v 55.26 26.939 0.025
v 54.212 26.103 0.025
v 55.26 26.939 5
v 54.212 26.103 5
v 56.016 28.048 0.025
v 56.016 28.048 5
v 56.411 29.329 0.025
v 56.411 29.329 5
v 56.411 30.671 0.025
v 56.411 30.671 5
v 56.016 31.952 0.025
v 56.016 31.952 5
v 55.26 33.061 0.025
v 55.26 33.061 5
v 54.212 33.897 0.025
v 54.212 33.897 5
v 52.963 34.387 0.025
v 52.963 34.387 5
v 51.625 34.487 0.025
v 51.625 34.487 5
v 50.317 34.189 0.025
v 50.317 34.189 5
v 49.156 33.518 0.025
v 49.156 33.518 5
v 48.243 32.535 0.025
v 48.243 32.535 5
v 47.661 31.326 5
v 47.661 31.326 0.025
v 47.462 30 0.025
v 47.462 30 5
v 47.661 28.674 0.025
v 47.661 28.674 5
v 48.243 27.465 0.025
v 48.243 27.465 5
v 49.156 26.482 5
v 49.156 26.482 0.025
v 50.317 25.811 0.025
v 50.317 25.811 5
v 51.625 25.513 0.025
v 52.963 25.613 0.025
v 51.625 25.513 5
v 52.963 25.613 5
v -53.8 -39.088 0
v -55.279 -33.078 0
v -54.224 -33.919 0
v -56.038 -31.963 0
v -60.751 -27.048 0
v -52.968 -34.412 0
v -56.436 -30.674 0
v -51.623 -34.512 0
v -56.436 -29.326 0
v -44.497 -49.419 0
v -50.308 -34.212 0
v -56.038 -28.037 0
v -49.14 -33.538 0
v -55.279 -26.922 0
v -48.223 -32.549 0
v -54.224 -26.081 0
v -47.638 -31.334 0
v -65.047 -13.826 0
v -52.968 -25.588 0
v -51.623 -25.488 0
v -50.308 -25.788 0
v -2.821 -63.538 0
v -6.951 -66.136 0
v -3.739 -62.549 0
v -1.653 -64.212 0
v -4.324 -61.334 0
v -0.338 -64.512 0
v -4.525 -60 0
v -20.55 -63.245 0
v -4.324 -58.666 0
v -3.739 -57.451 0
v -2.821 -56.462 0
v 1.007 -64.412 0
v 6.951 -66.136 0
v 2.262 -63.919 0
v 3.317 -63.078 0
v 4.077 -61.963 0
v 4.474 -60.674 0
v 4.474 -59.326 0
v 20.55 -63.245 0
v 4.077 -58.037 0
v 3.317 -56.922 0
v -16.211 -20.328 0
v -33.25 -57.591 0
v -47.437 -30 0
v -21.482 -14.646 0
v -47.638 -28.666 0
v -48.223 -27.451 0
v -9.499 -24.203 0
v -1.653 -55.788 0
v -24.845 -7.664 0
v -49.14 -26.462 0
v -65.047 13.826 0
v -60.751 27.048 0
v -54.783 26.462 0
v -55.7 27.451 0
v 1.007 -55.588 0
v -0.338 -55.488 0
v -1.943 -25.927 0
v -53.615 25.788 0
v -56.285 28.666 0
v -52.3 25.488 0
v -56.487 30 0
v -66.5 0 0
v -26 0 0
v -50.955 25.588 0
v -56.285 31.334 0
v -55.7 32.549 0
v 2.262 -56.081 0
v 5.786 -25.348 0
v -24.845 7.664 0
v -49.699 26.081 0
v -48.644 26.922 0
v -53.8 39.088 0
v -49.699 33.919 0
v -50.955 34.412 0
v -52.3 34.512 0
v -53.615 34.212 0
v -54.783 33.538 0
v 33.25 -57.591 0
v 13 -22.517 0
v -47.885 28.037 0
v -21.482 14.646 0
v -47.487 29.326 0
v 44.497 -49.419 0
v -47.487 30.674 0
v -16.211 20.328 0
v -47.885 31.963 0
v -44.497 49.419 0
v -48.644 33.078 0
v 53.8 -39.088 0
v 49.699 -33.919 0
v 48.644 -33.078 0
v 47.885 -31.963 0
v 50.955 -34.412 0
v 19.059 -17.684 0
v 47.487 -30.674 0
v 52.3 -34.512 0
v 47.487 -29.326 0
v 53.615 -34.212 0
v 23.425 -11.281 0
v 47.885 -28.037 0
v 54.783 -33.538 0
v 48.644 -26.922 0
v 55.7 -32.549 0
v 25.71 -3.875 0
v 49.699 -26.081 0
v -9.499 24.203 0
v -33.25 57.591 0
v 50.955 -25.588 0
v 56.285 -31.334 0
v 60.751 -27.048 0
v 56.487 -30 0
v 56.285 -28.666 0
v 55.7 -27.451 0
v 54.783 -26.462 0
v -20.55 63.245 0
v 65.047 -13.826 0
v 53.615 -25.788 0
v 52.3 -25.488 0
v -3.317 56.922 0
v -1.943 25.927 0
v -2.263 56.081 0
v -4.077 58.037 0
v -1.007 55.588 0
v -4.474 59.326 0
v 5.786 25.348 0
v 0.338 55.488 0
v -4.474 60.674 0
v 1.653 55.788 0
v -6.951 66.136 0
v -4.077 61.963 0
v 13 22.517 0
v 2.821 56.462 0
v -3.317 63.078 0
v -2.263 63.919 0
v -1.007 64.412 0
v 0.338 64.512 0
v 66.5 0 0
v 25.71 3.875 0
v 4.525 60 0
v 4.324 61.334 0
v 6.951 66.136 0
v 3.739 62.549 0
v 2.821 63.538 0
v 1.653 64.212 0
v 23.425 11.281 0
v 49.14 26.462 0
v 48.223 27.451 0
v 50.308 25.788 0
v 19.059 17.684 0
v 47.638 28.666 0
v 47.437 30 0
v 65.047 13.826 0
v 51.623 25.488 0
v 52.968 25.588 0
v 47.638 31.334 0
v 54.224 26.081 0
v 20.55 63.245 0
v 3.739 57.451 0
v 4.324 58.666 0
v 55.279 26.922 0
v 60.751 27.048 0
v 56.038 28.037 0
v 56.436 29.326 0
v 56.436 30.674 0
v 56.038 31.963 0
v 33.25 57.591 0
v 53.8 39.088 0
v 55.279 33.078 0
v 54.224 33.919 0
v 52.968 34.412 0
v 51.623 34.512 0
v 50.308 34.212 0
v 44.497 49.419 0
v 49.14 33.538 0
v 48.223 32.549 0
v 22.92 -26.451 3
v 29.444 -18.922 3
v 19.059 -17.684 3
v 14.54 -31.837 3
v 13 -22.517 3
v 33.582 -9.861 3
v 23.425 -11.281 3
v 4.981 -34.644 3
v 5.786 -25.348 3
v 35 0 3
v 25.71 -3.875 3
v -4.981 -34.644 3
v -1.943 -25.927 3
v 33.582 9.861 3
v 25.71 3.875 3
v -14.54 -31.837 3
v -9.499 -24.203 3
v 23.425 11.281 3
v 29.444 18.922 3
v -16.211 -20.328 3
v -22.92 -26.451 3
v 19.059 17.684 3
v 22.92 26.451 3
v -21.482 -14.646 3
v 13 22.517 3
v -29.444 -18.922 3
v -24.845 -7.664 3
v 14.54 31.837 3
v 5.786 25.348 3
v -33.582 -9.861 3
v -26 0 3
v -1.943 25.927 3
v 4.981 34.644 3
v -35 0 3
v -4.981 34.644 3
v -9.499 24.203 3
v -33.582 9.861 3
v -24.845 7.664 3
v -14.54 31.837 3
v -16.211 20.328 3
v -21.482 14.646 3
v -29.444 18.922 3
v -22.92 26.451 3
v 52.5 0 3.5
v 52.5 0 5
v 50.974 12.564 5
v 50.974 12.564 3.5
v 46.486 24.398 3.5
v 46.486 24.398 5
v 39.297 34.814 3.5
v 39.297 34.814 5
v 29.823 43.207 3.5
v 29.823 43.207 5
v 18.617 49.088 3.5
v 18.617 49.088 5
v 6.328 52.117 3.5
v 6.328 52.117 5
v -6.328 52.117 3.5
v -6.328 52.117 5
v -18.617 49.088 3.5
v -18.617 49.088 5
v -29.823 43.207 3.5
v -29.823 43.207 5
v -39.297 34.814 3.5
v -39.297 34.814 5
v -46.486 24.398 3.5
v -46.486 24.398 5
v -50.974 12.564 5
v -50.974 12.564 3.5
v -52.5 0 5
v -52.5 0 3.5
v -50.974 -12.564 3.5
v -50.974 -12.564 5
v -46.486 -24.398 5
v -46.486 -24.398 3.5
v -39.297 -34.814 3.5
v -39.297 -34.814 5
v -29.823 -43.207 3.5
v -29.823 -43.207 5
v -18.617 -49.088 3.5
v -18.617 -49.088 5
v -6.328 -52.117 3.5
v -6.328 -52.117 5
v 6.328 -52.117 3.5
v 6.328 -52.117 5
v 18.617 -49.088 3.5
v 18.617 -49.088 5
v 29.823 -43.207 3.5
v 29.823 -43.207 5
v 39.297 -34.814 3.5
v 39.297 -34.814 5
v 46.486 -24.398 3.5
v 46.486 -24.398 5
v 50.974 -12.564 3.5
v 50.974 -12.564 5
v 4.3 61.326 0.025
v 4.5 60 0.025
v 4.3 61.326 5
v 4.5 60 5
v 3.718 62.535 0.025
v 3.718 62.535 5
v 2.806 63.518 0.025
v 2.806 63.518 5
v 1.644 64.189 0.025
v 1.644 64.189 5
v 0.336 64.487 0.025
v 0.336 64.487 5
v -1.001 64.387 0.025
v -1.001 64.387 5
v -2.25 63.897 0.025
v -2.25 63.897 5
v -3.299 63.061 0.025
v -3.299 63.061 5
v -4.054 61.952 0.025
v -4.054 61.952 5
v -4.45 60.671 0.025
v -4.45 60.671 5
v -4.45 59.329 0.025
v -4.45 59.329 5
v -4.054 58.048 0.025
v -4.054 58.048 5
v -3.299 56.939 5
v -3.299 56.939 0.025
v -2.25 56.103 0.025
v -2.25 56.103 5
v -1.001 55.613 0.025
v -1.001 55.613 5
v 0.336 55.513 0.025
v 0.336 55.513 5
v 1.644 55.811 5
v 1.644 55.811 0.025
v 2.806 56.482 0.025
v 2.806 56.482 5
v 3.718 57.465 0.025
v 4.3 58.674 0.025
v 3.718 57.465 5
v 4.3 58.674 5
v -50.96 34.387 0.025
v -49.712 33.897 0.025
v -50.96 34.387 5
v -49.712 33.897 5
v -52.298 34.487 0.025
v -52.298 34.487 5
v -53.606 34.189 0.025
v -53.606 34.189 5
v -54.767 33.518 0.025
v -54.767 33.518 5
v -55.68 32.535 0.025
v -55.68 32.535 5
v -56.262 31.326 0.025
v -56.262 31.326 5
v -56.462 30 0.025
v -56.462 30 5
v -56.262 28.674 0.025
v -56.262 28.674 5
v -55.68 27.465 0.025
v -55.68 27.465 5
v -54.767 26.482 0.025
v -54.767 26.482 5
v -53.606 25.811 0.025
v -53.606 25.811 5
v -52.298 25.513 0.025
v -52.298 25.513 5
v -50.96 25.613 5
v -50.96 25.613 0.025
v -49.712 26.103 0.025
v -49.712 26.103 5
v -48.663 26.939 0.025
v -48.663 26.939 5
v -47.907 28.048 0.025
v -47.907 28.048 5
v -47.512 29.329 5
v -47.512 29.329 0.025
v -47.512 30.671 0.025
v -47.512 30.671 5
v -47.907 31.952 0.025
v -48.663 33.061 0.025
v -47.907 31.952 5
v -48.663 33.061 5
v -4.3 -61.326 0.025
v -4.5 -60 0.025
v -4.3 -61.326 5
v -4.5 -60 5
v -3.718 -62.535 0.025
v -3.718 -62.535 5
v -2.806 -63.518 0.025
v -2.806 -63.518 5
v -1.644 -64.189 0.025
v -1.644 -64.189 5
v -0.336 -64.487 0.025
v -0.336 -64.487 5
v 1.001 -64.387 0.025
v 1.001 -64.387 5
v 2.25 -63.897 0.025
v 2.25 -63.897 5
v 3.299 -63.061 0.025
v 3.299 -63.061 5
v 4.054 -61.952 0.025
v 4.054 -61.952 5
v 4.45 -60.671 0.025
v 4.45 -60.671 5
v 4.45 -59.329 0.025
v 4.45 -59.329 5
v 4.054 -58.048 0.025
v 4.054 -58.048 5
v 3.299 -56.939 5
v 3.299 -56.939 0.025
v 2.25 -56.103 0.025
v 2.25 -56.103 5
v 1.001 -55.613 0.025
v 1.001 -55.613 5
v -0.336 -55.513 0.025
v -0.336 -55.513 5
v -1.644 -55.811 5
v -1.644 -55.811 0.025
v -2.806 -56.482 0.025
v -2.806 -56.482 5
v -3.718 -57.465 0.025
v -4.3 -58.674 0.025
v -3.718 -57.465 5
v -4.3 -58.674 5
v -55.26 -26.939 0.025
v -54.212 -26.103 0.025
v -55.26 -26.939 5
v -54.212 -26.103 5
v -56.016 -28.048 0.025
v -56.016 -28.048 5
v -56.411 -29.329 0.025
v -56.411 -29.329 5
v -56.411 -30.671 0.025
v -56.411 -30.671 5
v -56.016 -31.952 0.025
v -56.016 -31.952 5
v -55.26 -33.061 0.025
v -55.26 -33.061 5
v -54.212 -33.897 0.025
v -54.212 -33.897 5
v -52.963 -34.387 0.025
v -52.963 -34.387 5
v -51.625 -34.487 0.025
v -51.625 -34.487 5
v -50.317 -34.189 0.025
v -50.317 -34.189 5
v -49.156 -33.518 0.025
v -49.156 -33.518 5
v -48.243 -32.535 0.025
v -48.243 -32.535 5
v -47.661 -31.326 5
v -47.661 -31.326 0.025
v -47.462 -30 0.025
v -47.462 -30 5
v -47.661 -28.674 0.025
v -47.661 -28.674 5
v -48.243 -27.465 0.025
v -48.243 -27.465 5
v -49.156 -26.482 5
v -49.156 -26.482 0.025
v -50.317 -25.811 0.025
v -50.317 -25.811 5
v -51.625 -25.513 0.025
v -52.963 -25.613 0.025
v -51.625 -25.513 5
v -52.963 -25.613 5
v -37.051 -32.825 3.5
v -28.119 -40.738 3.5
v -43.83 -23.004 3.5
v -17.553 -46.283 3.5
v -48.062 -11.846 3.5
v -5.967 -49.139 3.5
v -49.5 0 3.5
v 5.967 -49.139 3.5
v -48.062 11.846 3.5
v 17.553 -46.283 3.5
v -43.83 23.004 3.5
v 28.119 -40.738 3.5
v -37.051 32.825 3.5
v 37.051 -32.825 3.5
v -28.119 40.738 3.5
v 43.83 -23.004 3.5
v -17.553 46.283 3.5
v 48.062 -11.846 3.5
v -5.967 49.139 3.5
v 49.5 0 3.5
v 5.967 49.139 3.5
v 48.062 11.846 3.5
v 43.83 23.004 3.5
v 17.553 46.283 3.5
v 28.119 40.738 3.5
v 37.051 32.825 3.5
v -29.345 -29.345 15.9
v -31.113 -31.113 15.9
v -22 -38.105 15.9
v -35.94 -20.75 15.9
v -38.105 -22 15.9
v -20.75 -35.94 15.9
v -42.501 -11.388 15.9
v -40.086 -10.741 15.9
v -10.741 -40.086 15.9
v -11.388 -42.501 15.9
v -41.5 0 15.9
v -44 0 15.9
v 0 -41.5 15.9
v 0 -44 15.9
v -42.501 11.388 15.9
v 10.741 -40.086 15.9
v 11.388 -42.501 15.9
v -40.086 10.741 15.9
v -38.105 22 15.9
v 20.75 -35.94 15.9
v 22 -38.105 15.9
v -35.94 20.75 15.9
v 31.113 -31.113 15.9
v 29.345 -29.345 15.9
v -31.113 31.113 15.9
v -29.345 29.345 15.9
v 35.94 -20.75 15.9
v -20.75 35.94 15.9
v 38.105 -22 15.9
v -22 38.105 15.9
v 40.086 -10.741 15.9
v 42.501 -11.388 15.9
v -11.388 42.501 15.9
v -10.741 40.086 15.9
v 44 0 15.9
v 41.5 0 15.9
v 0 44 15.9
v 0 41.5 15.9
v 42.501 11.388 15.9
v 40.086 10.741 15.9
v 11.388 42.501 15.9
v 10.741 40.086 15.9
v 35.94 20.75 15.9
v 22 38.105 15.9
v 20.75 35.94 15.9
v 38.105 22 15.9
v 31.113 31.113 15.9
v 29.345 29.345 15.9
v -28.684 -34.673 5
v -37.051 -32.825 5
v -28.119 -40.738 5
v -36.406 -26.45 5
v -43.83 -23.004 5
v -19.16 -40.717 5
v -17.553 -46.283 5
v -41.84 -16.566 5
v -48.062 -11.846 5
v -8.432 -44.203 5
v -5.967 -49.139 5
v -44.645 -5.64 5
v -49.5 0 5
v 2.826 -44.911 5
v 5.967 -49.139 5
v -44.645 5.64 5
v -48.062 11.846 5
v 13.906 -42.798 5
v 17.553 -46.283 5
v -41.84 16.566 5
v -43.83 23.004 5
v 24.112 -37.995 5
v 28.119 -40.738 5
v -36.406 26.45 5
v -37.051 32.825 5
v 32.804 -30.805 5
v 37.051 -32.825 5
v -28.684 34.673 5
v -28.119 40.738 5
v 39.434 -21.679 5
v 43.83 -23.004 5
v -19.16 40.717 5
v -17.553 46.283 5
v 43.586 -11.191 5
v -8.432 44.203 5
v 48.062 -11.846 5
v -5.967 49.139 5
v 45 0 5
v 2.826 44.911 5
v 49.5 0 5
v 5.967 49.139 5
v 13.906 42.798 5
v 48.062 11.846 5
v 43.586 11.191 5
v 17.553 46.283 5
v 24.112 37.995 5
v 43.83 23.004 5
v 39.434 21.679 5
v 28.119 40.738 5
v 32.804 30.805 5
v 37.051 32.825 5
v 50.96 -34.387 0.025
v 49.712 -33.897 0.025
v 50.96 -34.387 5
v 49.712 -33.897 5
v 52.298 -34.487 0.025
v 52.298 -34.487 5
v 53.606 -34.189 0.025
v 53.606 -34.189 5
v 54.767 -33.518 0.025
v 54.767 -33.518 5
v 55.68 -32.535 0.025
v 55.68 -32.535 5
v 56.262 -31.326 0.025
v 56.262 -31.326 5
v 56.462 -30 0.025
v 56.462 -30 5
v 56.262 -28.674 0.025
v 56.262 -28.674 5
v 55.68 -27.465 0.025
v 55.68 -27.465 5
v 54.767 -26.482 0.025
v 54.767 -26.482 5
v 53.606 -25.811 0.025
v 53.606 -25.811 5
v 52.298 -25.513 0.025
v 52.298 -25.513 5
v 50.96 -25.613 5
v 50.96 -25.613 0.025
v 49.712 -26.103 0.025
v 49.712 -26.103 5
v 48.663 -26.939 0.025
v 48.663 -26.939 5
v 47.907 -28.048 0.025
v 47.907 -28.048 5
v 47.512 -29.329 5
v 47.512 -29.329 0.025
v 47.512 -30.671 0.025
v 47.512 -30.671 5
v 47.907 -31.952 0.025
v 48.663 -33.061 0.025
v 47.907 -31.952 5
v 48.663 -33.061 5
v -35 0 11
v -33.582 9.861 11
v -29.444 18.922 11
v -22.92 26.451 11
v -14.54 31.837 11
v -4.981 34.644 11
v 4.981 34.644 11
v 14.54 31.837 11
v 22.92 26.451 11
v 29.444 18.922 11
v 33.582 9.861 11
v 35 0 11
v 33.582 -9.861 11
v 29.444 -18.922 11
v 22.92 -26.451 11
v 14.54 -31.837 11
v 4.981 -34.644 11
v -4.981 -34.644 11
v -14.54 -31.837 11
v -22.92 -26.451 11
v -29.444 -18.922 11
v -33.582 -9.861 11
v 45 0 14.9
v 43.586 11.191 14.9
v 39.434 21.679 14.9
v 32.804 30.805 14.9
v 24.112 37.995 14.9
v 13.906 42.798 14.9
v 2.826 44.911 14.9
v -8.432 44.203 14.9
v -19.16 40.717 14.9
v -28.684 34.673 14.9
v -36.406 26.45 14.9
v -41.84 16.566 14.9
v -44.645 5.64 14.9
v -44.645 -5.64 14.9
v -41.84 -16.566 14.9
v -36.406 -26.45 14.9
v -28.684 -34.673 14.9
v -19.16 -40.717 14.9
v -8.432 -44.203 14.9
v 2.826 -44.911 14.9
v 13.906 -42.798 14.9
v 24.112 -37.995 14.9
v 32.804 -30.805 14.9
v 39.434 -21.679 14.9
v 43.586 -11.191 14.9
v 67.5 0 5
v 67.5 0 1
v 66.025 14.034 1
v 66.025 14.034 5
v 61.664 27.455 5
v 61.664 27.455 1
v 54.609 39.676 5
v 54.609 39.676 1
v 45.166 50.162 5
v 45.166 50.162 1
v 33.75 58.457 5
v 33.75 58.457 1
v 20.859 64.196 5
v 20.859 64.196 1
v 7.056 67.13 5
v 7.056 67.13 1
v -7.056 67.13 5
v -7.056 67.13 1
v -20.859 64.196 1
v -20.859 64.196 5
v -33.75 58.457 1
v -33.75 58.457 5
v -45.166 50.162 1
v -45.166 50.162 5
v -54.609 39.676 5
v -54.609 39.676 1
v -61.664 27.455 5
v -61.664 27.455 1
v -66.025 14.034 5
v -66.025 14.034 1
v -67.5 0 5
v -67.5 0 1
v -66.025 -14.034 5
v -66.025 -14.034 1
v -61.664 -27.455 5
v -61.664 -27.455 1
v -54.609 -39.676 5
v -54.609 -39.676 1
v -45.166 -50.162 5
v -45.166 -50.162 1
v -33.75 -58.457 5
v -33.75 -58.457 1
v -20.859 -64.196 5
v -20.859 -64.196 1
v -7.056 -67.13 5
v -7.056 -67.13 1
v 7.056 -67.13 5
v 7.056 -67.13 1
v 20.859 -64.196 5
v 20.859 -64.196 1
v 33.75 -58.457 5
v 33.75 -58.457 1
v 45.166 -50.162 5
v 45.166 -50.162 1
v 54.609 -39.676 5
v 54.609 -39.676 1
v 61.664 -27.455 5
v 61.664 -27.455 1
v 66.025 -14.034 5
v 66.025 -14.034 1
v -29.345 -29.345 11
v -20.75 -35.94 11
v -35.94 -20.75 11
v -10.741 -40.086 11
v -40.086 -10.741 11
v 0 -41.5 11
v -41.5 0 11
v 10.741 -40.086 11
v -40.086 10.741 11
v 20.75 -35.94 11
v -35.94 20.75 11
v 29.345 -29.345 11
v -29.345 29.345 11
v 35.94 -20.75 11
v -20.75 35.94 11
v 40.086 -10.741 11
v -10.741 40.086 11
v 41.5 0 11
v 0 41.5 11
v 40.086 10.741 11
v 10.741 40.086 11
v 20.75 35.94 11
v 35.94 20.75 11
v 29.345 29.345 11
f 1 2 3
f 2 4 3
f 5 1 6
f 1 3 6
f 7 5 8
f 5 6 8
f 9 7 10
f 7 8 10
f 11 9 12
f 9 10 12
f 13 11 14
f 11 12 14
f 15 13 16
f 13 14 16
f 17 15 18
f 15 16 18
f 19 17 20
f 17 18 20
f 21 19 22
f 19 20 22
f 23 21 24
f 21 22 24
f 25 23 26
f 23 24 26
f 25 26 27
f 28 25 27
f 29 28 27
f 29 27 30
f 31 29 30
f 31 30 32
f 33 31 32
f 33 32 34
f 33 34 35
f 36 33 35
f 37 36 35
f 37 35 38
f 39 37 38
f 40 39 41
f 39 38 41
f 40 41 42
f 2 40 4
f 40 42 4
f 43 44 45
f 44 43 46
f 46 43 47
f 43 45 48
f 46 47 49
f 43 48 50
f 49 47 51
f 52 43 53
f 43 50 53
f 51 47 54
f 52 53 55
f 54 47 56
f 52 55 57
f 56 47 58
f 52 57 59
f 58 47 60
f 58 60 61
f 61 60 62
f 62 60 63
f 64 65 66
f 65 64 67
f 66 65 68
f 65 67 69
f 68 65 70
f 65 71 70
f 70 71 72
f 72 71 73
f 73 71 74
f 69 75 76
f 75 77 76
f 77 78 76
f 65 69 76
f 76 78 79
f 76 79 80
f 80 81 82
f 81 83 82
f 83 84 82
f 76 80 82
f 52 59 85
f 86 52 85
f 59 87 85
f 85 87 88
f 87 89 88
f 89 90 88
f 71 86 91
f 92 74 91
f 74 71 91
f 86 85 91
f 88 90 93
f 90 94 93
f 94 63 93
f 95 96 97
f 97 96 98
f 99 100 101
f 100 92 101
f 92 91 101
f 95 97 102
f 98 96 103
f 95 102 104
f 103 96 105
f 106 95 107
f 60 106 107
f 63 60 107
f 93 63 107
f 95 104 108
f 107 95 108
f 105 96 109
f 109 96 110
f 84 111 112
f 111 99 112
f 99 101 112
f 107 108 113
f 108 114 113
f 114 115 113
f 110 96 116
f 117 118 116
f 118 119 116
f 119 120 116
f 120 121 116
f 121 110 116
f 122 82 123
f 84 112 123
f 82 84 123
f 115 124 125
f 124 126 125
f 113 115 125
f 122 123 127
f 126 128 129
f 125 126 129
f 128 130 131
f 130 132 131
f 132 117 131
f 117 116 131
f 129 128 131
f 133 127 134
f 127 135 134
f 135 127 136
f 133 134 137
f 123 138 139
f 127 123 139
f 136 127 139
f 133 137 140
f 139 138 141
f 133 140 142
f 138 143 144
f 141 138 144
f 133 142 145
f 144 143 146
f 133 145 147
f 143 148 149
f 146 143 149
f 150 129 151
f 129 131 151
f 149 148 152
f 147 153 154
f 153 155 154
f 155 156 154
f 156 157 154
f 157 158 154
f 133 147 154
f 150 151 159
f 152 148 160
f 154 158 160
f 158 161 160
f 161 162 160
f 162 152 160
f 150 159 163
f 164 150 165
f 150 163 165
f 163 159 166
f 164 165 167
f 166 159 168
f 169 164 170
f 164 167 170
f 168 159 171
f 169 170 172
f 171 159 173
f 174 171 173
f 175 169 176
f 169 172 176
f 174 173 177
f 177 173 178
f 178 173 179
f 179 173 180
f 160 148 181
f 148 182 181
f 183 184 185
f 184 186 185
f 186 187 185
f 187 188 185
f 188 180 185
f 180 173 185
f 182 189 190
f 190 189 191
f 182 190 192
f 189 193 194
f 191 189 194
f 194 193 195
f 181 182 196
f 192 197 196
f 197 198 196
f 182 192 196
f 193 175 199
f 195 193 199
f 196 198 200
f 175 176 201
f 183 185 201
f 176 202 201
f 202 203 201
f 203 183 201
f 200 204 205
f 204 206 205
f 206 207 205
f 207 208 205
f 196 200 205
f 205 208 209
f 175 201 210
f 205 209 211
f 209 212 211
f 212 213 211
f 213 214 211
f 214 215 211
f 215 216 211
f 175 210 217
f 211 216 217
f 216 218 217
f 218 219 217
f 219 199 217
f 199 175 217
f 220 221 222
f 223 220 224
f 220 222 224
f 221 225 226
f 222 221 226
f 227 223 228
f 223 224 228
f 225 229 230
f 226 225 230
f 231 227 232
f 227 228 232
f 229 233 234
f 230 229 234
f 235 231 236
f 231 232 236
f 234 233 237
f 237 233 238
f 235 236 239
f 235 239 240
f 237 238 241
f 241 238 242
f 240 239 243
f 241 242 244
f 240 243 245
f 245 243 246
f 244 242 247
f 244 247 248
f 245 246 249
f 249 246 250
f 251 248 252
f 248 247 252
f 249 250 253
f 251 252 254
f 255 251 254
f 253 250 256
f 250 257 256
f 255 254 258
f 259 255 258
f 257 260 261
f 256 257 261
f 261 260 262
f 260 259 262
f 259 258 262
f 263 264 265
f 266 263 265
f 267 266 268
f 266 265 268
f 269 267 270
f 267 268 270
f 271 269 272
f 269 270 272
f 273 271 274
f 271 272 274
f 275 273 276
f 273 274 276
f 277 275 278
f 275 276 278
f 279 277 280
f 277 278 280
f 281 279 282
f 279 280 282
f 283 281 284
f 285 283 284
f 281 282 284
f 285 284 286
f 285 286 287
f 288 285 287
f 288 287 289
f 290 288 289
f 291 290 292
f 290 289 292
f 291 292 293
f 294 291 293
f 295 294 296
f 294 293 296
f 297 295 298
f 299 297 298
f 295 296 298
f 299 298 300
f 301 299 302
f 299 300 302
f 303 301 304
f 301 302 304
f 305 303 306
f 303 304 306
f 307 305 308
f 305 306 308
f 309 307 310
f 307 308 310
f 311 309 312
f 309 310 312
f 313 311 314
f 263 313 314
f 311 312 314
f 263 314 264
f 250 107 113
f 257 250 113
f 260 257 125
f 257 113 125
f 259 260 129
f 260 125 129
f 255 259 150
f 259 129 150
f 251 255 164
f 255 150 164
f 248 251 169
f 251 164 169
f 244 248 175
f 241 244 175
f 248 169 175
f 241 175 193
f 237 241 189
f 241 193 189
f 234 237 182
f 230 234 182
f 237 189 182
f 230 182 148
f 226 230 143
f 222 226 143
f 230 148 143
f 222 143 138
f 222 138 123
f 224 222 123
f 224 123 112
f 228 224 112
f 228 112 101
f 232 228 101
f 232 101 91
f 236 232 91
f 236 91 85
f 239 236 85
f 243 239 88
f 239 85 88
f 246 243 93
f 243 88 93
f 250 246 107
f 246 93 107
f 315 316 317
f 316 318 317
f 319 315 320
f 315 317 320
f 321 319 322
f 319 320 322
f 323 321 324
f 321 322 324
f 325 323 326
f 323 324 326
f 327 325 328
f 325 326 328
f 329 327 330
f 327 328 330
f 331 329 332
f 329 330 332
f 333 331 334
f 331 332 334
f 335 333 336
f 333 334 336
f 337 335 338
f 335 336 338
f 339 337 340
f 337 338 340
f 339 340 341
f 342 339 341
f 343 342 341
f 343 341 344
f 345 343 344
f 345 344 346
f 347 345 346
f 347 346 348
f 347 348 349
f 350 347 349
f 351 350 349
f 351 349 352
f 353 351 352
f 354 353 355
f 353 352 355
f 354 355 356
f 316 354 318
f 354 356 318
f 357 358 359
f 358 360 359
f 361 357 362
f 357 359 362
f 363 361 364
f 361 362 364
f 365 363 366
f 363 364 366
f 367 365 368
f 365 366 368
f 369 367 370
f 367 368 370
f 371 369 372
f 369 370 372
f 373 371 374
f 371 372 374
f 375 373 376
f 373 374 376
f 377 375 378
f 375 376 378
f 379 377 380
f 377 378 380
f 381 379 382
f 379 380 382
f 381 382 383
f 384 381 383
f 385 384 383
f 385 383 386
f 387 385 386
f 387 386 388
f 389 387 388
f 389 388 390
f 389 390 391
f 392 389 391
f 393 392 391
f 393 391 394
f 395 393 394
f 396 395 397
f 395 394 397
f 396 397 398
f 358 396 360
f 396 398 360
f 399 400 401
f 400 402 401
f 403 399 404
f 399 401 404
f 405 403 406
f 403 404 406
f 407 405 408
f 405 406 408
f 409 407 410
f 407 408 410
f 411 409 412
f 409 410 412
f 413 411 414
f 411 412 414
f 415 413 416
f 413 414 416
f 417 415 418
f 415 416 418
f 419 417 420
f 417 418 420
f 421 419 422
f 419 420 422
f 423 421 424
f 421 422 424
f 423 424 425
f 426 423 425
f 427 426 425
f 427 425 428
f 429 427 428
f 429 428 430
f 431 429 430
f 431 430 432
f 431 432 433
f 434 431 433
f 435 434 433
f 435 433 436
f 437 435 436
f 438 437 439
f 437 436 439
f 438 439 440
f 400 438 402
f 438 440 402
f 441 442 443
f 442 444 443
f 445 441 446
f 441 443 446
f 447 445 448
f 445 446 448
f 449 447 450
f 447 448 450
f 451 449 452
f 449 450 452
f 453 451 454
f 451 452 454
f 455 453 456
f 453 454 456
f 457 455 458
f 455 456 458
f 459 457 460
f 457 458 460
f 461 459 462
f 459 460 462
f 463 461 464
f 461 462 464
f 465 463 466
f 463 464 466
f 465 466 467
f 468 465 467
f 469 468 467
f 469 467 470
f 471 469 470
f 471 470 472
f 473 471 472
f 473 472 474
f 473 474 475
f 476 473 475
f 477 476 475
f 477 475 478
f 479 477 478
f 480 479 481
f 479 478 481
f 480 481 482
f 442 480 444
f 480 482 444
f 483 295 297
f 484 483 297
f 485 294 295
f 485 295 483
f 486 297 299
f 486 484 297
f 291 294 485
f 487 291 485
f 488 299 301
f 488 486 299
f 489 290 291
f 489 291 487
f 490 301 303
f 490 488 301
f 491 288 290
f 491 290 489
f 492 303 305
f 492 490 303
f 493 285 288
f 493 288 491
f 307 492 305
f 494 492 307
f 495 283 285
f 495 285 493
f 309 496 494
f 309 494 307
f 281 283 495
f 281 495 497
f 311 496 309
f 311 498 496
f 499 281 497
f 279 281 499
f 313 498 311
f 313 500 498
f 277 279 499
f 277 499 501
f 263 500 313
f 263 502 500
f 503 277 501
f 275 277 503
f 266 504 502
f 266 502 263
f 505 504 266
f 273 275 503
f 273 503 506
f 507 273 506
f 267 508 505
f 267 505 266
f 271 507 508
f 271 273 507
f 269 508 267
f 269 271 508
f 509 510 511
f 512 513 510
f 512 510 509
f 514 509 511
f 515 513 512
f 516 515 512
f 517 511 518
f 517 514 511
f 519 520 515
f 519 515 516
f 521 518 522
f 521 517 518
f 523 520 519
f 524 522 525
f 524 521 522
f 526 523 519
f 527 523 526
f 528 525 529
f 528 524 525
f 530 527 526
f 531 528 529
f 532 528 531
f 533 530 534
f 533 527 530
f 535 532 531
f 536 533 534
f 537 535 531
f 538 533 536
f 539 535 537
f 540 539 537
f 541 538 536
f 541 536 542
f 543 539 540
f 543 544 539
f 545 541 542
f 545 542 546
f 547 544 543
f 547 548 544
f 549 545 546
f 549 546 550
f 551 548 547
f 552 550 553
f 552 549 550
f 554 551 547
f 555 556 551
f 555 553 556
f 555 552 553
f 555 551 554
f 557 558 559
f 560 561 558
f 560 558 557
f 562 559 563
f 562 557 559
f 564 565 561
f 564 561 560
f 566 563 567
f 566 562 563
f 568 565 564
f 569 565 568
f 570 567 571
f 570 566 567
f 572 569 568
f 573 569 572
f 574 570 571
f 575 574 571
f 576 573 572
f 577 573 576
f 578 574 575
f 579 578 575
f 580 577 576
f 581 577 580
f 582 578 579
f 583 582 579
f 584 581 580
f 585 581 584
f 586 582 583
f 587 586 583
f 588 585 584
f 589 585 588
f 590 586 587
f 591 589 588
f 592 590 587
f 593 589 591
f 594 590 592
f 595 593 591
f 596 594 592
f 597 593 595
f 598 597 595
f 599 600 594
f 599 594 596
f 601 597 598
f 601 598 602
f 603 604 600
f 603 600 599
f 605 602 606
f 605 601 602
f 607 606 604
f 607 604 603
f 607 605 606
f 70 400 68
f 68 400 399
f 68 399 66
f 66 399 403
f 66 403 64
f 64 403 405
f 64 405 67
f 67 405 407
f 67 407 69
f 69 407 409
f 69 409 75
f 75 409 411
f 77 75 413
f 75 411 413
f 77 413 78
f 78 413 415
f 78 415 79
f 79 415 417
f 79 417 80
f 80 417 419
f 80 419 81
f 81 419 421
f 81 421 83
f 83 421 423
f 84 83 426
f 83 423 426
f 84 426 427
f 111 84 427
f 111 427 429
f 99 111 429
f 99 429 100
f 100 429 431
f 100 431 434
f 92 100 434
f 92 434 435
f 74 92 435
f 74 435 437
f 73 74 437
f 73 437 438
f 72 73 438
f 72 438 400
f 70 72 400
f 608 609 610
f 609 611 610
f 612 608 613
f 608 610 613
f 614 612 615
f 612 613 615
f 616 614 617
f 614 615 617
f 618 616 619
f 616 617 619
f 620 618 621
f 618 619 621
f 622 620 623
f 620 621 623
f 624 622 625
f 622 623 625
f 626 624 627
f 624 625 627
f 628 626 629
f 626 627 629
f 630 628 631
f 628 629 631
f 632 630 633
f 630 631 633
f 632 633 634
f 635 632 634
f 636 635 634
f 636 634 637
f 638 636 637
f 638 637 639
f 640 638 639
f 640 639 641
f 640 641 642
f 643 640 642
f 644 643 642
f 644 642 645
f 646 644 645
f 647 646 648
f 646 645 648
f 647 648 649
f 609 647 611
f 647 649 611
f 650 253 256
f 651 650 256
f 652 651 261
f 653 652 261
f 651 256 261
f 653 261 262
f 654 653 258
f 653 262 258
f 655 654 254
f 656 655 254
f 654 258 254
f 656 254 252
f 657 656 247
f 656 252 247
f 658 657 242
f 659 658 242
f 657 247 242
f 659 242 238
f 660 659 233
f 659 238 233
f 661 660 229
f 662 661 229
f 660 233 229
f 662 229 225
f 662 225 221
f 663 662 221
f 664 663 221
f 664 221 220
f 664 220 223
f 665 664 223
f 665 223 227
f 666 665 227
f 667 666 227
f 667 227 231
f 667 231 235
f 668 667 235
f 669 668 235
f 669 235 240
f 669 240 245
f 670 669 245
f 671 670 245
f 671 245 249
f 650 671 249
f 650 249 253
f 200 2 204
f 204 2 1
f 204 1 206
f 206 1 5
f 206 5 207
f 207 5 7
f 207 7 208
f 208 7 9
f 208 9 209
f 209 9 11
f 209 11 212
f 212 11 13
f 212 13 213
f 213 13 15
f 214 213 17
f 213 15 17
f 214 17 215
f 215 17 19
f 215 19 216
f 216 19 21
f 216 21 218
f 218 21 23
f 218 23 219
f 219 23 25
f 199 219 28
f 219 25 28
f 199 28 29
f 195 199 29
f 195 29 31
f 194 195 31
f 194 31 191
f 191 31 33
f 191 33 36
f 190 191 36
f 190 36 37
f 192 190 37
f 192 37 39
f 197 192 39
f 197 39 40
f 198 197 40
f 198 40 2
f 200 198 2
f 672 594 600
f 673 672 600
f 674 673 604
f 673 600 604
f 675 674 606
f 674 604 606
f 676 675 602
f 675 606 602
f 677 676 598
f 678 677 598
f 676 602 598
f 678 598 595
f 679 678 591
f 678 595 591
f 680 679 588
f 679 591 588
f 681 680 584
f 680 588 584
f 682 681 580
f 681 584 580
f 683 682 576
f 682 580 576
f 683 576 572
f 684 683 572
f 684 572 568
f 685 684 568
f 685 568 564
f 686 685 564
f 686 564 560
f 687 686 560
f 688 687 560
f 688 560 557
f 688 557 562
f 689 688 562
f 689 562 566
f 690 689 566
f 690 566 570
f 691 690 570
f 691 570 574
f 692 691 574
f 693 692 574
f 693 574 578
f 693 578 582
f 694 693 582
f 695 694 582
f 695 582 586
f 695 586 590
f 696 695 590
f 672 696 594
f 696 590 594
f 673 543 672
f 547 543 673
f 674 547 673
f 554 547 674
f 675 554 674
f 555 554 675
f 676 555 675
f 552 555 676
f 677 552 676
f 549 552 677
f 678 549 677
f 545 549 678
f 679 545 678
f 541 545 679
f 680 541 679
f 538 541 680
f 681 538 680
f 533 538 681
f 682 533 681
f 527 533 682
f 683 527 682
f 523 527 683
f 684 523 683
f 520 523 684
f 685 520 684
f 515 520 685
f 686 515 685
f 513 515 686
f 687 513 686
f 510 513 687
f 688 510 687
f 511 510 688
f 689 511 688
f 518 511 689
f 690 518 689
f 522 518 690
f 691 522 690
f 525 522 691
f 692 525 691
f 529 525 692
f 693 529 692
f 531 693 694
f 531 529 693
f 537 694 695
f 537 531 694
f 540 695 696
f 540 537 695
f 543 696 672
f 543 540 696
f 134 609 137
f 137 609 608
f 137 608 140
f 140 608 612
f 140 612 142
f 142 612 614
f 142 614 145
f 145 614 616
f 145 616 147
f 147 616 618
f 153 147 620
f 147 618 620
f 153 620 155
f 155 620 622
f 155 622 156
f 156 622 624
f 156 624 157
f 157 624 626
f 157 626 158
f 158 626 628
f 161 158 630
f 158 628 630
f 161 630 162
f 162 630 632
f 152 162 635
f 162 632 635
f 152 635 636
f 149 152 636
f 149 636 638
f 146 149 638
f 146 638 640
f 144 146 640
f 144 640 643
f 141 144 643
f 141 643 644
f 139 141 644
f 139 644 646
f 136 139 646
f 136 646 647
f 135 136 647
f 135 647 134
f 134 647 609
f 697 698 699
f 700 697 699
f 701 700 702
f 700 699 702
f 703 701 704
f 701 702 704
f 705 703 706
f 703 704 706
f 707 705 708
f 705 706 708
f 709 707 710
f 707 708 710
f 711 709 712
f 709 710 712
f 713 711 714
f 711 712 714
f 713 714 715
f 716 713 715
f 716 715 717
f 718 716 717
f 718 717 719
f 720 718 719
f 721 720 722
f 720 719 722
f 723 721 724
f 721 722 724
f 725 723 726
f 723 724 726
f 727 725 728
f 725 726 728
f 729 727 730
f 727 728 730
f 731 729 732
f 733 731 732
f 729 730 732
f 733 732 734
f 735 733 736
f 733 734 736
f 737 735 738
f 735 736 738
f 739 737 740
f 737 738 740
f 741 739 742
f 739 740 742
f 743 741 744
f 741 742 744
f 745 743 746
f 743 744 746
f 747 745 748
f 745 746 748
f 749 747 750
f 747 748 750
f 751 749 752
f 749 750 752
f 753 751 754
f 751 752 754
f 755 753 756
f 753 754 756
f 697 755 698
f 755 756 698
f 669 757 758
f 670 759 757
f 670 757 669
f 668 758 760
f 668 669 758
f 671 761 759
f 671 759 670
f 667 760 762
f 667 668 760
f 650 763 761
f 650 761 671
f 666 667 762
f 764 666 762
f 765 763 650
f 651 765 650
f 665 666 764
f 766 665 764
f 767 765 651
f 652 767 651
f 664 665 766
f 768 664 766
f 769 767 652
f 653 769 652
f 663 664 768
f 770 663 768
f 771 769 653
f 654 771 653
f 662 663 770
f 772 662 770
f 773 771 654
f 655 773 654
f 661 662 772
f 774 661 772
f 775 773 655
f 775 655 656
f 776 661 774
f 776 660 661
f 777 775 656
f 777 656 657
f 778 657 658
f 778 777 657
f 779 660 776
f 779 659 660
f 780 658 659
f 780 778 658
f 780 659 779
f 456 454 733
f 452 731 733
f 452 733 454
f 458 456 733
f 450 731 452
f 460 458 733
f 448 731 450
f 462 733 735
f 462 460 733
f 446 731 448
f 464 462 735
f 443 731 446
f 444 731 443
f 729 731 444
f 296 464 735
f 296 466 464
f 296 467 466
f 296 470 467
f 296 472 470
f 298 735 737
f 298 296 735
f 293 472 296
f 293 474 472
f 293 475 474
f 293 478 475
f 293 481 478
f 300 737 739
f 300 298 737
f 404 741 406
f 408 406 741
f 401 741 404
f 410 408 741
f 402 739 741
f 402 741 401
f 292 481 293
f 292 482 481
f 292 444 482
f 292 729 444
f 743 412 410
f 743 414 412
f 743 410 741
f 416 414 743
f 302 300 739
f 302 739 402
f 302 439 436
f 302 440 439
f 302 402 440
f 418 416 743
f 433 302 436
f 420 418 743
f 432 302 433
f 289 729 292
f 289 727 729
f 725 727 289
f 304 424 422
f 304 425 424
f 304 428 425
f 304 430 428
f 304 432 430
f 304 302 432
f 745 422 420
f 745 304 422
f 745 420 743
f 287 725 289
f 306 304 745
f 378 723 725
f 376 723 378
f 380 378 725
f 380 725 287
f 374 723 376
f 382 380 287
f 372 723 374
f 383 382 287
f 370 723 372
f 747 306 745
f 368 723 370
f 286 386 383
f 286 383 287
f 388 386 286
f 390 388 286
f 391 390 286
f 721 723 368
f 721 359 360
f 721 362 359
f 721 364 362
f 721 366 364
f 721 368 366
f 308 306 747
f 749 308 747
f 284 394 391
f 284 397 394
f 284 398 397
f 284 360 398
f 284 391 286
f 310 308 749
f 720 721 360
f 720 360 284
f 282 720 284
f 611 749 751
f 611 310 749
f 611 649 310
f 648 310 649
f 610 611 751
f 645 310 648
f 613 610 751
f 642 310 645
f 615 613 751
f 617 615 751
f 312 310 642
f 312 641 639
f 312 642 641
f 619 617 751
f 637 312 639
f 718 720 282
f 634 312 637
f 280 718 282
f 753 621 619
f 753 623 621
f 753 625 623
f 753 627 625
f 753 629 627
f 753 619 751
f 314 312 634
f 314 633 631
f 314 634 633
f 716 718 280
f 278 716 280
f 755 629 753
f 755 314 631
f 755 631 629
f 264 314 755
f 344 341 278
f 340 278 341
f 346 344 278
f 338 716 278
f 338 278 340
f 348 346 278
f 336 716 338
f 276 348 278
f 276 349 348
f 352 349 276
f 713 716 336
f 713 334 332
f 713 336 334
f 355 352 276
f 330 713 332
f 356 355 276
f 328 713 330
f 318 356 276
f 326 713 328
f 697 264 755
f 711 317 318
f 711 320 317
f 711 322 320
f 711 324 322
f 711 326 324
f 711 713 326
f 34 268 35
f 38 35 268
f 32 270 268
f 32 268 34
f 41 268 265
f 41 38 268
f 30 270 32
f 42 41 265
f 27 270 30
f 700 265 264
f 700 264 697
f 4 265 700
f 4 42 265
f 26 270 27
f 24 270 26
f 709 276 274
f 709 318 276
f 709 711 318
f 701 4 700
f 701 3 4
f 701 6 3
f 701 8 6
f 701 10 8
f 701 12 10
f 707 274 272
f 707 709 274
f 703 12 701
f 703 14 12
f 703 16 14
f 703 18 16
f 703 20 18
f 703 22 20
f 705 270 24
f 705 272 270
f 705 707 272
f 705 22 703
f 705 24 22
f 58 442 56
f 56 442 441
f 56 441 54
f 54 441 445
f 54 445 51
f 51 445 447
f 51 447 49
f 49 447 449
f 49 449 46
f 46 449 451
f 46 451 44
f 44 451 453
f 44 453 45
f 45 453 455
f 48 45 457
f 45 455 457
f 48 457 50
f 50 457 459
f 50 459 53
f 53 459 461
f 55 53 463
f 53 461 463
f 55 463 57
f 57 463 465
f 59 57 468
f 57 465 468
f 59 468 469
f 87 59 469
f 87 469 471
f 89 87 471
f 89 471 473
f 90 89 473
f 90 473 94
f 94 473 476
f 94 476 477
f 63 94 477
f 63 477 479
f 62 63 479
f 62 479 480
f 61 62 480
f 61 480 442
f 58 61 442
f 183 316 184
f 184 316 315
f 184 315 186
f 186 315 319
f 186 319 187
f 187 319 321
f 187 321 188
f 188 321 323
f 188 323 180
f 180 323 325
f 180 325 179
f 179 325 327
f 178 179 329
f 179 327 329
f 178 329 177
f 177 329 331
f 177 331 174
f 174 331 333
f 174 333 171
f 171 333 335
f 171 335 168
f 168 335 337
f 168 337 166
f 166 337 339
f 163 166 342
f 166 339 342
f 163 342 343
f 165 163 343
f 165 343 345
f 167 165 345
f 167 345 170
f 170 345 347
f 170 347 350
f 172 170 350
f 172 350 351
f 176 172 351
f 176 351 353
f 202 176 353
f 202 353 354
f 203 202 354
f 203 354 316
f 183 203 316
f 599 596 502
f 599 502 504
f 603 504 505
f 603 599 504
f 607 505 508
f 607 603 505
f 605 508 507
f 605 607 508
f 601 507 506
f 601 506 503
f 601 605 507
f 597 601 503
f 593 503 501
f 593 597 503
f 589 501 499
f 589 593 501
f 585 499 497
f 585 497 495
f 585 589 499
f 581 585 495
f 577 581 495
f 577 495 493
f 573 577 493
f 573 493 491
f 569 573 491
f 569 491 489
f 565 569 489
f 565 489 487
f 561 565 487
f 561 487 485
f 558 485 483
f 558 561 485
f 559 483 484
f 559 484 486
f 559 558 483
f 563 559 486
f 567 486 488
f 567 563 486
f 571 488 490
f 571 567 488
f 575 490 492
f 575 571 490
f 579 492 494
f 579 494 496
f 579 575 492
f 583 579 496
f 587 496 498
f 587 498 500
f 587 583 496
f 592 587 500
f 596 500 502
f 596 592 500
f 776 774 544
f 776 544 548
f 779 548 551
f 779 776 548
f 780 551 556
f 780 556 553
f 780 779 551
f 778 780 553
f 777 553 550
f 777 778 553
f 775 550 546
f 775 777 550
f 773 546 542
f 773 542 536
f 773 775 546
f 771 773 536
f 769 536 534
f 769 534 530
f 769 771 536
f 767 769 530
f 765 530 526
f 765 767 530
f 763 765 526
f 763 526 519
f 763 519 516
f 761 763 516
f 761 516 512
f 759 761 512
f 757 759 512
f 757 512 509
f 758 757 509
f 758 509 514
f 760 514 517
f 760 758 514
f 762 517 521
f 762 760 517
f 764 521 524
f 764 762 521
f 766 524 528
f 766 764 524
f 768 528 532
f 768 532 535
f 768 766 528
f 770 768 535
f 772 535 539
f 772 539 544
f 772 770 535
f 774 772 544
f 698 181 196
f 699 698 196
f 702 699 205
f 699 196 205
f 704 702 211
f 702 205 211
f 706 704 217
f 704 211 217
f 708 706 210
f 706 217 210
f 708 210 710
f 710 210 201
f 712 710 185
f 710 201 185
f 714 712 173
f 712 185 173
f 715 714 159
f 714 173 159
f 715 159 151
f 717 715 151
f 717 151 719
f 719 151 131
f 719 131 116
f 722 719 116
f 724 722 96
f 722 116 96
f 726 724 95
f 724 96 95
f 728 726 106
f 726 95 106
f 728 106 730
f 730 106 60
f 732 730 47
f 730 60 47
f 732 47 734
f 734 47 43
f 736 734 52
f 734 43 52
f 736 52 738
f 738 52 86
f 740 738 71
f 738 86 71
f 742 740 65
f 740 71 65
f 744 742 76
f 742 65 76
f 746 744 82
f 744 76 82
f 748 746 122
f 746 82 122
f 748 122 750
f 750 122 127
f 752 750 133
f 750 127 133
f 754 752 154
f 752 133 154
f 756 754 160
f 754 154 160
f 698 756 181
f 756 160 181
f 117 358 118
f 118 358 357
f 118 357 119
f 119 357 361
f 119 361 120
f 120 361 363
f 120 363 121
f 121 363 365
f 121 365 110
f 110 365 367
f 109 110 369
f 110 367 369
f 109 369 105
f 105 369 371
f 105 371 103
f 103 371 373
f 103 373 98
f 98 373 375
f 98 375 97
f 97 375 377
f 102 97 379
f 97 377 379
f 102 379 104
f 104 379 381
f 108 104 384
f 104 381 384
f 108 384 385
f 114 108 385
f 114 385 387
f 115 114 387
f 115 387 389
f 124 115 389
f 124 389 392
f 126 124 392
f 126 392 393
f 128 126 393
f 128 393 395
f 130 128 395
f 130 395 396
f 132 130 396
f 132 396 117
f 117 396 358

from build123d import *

# Parameters (mm, degrees)
SCHIZZO2_R                     = 67.5
ESTRUSIONE_ESTRUSIONE1_DEPTH   = 5
SCHIZZO3_R                     = 45
ESTRUSIONE_ESTRUSIONE2_DEPTH   = 6
SCHIZZO4_R                     = 26
TAGLIO_ESTRUSIONE1_DEPTH       = 3
SCHIZZO5_R                     = 35
TAGLIO_ESTRUSIONE2_DEPTH       = 9
SMUSSO1_SIZE                   = 1
FORO_PER_VITE_M8_1_D           = 9
FORO_PER_VITE_M8_1_CSINK_D     = 9.05
FORO_PER_VITE_M8_1_CSINK_ANGLE = 90
RIPETIZIONECIRCOLARE1_COUNT    = 6
SCHIZZO9_R                     = 52.5
SCHIZZO9_R_2                   = 49.5
TAGLIO_ESTRUSIONE3_DEPTH       = 1.5
SCHIZZO10_R                    = 45
SCHIZZO10_R_2                  = 41.5
ESTRUSIONE_ESTRUSIONE3_DEPTH   = 4.9
SMUSSO2_SIZE                   = 1


with BuildPart() as part:
    # Schizzo2 → Estrusione-Estrusione1 (new body)
    with BuildSketch(Plane.XY):
        Circle(SCHIZZO2_R)
    extrude(amount=ESTRUSIONE_ESTRUSIONE1_DEPTH)

    # Schizzo3 → Estrusione-Estrusione2 (add)
    with BuildSketch(Plane.XY.offset(5)):
        Circle(SCHIZZO3_R)
    extrude(amount=ESTRUSIONE_ESTRUSIONE2_DEPTH)

    # Schizzo4 → Taglio-Estrusione1 (cut)
    with BuildSketch(Plane(origin=(0, 0, 0), x_dir=(-1, 0, 0), z_dir=(0, 0, -1))):
        Circle(SCHIZZO4_R)
    extrude(amount=-TAGLIO_ESTRUSIONE1_DEPTH, mode=Mode.SUBTRACT)

    # Schizzo5 → Taglio-Estrusione2 (cut, through all)
    with BuildSketch(Plane(origin=(0, 0, 3), x_dir=(-1, 0, 0), z_dir=(0, 0, -1))):
        Circle(SCHIZZO5_R)
    extrude(amount=-TAGLIO_ESTRUSIONE2_DEPTH, mode=Mode.SUBTRACT)

    # Smusso1
    smusso1_edges = [part.edges().sort_by_distance(p)[0] for p in [
        (-67.5, 0, 0),
    ]]
    chamfer(smusso1_edges, length=SMUSSO1_SIZE)

    # Foro per Vite M8-1 (through all)
    with Locations(Plane(origin=(0, 0, 0), x_dir=(-1, 0, 0), z_dir=(0, 0, -1))):
        with Locations((0, 60)):
            foro_per_vite_m8_1 = CounterSinkHole(FORO_PER_VITE_M8_1_D / 2, FORO_PER_VITE_M8_1_CSINK_D / 2, counter_sink_angle=FORO_PER_VITE_M8_1_CSINK_ANGLE)

    # RipetizioneCircolare1: Foro per Vite M8-1 ×6 about axis
    ripetizionecircolare1_axis = Axis((0, 0, 0), (0, 0, 1))
    for i in range(1, RIPETIZIONECIRCOLARE1_COUNT):
        add(foro_per_vite_m8_1.rotate(ripetizionecircolare1_axis, i * 360 / RIPETIZIONECIRCOLARE1_COUNT), mode=Mode.SUBTRACT)

    # Schizzo9 → Taglio-Estrusione3 (cut)
    with BuildSketch(Plane.XY.offset(5)):
        Circle(SCHIZZO9_R)
        Circle(SCHIZZO9_R_2, mode=Mode.SUBTRACT)
    extrude(amount=-TAGLIO_ESTRUSIONE3_DEPTH, mode=Mode.SUBTRACT)

    # Schizzo10 → Estrusione-Estrusione3 (add)
    with BuildSketch(Plane.XY.offset(11)):
        Circle(SCHIZZO10_R)
        Circle(SCHIZZO10_R_2, mode=Mode.SUBTRACT)
    extrude(amount=ESTRUSIONE_ESTRUSIONE3_DEPTH)

    # Smusso2
    smusso2_edges = [part.edges().sort_by_distance(p)[0] for p in [
        (-45, 0, 15.9),
    ]]
    chamfer(smusso2_edges, length=SMUSSO2_SIZE)


solid = part.part
